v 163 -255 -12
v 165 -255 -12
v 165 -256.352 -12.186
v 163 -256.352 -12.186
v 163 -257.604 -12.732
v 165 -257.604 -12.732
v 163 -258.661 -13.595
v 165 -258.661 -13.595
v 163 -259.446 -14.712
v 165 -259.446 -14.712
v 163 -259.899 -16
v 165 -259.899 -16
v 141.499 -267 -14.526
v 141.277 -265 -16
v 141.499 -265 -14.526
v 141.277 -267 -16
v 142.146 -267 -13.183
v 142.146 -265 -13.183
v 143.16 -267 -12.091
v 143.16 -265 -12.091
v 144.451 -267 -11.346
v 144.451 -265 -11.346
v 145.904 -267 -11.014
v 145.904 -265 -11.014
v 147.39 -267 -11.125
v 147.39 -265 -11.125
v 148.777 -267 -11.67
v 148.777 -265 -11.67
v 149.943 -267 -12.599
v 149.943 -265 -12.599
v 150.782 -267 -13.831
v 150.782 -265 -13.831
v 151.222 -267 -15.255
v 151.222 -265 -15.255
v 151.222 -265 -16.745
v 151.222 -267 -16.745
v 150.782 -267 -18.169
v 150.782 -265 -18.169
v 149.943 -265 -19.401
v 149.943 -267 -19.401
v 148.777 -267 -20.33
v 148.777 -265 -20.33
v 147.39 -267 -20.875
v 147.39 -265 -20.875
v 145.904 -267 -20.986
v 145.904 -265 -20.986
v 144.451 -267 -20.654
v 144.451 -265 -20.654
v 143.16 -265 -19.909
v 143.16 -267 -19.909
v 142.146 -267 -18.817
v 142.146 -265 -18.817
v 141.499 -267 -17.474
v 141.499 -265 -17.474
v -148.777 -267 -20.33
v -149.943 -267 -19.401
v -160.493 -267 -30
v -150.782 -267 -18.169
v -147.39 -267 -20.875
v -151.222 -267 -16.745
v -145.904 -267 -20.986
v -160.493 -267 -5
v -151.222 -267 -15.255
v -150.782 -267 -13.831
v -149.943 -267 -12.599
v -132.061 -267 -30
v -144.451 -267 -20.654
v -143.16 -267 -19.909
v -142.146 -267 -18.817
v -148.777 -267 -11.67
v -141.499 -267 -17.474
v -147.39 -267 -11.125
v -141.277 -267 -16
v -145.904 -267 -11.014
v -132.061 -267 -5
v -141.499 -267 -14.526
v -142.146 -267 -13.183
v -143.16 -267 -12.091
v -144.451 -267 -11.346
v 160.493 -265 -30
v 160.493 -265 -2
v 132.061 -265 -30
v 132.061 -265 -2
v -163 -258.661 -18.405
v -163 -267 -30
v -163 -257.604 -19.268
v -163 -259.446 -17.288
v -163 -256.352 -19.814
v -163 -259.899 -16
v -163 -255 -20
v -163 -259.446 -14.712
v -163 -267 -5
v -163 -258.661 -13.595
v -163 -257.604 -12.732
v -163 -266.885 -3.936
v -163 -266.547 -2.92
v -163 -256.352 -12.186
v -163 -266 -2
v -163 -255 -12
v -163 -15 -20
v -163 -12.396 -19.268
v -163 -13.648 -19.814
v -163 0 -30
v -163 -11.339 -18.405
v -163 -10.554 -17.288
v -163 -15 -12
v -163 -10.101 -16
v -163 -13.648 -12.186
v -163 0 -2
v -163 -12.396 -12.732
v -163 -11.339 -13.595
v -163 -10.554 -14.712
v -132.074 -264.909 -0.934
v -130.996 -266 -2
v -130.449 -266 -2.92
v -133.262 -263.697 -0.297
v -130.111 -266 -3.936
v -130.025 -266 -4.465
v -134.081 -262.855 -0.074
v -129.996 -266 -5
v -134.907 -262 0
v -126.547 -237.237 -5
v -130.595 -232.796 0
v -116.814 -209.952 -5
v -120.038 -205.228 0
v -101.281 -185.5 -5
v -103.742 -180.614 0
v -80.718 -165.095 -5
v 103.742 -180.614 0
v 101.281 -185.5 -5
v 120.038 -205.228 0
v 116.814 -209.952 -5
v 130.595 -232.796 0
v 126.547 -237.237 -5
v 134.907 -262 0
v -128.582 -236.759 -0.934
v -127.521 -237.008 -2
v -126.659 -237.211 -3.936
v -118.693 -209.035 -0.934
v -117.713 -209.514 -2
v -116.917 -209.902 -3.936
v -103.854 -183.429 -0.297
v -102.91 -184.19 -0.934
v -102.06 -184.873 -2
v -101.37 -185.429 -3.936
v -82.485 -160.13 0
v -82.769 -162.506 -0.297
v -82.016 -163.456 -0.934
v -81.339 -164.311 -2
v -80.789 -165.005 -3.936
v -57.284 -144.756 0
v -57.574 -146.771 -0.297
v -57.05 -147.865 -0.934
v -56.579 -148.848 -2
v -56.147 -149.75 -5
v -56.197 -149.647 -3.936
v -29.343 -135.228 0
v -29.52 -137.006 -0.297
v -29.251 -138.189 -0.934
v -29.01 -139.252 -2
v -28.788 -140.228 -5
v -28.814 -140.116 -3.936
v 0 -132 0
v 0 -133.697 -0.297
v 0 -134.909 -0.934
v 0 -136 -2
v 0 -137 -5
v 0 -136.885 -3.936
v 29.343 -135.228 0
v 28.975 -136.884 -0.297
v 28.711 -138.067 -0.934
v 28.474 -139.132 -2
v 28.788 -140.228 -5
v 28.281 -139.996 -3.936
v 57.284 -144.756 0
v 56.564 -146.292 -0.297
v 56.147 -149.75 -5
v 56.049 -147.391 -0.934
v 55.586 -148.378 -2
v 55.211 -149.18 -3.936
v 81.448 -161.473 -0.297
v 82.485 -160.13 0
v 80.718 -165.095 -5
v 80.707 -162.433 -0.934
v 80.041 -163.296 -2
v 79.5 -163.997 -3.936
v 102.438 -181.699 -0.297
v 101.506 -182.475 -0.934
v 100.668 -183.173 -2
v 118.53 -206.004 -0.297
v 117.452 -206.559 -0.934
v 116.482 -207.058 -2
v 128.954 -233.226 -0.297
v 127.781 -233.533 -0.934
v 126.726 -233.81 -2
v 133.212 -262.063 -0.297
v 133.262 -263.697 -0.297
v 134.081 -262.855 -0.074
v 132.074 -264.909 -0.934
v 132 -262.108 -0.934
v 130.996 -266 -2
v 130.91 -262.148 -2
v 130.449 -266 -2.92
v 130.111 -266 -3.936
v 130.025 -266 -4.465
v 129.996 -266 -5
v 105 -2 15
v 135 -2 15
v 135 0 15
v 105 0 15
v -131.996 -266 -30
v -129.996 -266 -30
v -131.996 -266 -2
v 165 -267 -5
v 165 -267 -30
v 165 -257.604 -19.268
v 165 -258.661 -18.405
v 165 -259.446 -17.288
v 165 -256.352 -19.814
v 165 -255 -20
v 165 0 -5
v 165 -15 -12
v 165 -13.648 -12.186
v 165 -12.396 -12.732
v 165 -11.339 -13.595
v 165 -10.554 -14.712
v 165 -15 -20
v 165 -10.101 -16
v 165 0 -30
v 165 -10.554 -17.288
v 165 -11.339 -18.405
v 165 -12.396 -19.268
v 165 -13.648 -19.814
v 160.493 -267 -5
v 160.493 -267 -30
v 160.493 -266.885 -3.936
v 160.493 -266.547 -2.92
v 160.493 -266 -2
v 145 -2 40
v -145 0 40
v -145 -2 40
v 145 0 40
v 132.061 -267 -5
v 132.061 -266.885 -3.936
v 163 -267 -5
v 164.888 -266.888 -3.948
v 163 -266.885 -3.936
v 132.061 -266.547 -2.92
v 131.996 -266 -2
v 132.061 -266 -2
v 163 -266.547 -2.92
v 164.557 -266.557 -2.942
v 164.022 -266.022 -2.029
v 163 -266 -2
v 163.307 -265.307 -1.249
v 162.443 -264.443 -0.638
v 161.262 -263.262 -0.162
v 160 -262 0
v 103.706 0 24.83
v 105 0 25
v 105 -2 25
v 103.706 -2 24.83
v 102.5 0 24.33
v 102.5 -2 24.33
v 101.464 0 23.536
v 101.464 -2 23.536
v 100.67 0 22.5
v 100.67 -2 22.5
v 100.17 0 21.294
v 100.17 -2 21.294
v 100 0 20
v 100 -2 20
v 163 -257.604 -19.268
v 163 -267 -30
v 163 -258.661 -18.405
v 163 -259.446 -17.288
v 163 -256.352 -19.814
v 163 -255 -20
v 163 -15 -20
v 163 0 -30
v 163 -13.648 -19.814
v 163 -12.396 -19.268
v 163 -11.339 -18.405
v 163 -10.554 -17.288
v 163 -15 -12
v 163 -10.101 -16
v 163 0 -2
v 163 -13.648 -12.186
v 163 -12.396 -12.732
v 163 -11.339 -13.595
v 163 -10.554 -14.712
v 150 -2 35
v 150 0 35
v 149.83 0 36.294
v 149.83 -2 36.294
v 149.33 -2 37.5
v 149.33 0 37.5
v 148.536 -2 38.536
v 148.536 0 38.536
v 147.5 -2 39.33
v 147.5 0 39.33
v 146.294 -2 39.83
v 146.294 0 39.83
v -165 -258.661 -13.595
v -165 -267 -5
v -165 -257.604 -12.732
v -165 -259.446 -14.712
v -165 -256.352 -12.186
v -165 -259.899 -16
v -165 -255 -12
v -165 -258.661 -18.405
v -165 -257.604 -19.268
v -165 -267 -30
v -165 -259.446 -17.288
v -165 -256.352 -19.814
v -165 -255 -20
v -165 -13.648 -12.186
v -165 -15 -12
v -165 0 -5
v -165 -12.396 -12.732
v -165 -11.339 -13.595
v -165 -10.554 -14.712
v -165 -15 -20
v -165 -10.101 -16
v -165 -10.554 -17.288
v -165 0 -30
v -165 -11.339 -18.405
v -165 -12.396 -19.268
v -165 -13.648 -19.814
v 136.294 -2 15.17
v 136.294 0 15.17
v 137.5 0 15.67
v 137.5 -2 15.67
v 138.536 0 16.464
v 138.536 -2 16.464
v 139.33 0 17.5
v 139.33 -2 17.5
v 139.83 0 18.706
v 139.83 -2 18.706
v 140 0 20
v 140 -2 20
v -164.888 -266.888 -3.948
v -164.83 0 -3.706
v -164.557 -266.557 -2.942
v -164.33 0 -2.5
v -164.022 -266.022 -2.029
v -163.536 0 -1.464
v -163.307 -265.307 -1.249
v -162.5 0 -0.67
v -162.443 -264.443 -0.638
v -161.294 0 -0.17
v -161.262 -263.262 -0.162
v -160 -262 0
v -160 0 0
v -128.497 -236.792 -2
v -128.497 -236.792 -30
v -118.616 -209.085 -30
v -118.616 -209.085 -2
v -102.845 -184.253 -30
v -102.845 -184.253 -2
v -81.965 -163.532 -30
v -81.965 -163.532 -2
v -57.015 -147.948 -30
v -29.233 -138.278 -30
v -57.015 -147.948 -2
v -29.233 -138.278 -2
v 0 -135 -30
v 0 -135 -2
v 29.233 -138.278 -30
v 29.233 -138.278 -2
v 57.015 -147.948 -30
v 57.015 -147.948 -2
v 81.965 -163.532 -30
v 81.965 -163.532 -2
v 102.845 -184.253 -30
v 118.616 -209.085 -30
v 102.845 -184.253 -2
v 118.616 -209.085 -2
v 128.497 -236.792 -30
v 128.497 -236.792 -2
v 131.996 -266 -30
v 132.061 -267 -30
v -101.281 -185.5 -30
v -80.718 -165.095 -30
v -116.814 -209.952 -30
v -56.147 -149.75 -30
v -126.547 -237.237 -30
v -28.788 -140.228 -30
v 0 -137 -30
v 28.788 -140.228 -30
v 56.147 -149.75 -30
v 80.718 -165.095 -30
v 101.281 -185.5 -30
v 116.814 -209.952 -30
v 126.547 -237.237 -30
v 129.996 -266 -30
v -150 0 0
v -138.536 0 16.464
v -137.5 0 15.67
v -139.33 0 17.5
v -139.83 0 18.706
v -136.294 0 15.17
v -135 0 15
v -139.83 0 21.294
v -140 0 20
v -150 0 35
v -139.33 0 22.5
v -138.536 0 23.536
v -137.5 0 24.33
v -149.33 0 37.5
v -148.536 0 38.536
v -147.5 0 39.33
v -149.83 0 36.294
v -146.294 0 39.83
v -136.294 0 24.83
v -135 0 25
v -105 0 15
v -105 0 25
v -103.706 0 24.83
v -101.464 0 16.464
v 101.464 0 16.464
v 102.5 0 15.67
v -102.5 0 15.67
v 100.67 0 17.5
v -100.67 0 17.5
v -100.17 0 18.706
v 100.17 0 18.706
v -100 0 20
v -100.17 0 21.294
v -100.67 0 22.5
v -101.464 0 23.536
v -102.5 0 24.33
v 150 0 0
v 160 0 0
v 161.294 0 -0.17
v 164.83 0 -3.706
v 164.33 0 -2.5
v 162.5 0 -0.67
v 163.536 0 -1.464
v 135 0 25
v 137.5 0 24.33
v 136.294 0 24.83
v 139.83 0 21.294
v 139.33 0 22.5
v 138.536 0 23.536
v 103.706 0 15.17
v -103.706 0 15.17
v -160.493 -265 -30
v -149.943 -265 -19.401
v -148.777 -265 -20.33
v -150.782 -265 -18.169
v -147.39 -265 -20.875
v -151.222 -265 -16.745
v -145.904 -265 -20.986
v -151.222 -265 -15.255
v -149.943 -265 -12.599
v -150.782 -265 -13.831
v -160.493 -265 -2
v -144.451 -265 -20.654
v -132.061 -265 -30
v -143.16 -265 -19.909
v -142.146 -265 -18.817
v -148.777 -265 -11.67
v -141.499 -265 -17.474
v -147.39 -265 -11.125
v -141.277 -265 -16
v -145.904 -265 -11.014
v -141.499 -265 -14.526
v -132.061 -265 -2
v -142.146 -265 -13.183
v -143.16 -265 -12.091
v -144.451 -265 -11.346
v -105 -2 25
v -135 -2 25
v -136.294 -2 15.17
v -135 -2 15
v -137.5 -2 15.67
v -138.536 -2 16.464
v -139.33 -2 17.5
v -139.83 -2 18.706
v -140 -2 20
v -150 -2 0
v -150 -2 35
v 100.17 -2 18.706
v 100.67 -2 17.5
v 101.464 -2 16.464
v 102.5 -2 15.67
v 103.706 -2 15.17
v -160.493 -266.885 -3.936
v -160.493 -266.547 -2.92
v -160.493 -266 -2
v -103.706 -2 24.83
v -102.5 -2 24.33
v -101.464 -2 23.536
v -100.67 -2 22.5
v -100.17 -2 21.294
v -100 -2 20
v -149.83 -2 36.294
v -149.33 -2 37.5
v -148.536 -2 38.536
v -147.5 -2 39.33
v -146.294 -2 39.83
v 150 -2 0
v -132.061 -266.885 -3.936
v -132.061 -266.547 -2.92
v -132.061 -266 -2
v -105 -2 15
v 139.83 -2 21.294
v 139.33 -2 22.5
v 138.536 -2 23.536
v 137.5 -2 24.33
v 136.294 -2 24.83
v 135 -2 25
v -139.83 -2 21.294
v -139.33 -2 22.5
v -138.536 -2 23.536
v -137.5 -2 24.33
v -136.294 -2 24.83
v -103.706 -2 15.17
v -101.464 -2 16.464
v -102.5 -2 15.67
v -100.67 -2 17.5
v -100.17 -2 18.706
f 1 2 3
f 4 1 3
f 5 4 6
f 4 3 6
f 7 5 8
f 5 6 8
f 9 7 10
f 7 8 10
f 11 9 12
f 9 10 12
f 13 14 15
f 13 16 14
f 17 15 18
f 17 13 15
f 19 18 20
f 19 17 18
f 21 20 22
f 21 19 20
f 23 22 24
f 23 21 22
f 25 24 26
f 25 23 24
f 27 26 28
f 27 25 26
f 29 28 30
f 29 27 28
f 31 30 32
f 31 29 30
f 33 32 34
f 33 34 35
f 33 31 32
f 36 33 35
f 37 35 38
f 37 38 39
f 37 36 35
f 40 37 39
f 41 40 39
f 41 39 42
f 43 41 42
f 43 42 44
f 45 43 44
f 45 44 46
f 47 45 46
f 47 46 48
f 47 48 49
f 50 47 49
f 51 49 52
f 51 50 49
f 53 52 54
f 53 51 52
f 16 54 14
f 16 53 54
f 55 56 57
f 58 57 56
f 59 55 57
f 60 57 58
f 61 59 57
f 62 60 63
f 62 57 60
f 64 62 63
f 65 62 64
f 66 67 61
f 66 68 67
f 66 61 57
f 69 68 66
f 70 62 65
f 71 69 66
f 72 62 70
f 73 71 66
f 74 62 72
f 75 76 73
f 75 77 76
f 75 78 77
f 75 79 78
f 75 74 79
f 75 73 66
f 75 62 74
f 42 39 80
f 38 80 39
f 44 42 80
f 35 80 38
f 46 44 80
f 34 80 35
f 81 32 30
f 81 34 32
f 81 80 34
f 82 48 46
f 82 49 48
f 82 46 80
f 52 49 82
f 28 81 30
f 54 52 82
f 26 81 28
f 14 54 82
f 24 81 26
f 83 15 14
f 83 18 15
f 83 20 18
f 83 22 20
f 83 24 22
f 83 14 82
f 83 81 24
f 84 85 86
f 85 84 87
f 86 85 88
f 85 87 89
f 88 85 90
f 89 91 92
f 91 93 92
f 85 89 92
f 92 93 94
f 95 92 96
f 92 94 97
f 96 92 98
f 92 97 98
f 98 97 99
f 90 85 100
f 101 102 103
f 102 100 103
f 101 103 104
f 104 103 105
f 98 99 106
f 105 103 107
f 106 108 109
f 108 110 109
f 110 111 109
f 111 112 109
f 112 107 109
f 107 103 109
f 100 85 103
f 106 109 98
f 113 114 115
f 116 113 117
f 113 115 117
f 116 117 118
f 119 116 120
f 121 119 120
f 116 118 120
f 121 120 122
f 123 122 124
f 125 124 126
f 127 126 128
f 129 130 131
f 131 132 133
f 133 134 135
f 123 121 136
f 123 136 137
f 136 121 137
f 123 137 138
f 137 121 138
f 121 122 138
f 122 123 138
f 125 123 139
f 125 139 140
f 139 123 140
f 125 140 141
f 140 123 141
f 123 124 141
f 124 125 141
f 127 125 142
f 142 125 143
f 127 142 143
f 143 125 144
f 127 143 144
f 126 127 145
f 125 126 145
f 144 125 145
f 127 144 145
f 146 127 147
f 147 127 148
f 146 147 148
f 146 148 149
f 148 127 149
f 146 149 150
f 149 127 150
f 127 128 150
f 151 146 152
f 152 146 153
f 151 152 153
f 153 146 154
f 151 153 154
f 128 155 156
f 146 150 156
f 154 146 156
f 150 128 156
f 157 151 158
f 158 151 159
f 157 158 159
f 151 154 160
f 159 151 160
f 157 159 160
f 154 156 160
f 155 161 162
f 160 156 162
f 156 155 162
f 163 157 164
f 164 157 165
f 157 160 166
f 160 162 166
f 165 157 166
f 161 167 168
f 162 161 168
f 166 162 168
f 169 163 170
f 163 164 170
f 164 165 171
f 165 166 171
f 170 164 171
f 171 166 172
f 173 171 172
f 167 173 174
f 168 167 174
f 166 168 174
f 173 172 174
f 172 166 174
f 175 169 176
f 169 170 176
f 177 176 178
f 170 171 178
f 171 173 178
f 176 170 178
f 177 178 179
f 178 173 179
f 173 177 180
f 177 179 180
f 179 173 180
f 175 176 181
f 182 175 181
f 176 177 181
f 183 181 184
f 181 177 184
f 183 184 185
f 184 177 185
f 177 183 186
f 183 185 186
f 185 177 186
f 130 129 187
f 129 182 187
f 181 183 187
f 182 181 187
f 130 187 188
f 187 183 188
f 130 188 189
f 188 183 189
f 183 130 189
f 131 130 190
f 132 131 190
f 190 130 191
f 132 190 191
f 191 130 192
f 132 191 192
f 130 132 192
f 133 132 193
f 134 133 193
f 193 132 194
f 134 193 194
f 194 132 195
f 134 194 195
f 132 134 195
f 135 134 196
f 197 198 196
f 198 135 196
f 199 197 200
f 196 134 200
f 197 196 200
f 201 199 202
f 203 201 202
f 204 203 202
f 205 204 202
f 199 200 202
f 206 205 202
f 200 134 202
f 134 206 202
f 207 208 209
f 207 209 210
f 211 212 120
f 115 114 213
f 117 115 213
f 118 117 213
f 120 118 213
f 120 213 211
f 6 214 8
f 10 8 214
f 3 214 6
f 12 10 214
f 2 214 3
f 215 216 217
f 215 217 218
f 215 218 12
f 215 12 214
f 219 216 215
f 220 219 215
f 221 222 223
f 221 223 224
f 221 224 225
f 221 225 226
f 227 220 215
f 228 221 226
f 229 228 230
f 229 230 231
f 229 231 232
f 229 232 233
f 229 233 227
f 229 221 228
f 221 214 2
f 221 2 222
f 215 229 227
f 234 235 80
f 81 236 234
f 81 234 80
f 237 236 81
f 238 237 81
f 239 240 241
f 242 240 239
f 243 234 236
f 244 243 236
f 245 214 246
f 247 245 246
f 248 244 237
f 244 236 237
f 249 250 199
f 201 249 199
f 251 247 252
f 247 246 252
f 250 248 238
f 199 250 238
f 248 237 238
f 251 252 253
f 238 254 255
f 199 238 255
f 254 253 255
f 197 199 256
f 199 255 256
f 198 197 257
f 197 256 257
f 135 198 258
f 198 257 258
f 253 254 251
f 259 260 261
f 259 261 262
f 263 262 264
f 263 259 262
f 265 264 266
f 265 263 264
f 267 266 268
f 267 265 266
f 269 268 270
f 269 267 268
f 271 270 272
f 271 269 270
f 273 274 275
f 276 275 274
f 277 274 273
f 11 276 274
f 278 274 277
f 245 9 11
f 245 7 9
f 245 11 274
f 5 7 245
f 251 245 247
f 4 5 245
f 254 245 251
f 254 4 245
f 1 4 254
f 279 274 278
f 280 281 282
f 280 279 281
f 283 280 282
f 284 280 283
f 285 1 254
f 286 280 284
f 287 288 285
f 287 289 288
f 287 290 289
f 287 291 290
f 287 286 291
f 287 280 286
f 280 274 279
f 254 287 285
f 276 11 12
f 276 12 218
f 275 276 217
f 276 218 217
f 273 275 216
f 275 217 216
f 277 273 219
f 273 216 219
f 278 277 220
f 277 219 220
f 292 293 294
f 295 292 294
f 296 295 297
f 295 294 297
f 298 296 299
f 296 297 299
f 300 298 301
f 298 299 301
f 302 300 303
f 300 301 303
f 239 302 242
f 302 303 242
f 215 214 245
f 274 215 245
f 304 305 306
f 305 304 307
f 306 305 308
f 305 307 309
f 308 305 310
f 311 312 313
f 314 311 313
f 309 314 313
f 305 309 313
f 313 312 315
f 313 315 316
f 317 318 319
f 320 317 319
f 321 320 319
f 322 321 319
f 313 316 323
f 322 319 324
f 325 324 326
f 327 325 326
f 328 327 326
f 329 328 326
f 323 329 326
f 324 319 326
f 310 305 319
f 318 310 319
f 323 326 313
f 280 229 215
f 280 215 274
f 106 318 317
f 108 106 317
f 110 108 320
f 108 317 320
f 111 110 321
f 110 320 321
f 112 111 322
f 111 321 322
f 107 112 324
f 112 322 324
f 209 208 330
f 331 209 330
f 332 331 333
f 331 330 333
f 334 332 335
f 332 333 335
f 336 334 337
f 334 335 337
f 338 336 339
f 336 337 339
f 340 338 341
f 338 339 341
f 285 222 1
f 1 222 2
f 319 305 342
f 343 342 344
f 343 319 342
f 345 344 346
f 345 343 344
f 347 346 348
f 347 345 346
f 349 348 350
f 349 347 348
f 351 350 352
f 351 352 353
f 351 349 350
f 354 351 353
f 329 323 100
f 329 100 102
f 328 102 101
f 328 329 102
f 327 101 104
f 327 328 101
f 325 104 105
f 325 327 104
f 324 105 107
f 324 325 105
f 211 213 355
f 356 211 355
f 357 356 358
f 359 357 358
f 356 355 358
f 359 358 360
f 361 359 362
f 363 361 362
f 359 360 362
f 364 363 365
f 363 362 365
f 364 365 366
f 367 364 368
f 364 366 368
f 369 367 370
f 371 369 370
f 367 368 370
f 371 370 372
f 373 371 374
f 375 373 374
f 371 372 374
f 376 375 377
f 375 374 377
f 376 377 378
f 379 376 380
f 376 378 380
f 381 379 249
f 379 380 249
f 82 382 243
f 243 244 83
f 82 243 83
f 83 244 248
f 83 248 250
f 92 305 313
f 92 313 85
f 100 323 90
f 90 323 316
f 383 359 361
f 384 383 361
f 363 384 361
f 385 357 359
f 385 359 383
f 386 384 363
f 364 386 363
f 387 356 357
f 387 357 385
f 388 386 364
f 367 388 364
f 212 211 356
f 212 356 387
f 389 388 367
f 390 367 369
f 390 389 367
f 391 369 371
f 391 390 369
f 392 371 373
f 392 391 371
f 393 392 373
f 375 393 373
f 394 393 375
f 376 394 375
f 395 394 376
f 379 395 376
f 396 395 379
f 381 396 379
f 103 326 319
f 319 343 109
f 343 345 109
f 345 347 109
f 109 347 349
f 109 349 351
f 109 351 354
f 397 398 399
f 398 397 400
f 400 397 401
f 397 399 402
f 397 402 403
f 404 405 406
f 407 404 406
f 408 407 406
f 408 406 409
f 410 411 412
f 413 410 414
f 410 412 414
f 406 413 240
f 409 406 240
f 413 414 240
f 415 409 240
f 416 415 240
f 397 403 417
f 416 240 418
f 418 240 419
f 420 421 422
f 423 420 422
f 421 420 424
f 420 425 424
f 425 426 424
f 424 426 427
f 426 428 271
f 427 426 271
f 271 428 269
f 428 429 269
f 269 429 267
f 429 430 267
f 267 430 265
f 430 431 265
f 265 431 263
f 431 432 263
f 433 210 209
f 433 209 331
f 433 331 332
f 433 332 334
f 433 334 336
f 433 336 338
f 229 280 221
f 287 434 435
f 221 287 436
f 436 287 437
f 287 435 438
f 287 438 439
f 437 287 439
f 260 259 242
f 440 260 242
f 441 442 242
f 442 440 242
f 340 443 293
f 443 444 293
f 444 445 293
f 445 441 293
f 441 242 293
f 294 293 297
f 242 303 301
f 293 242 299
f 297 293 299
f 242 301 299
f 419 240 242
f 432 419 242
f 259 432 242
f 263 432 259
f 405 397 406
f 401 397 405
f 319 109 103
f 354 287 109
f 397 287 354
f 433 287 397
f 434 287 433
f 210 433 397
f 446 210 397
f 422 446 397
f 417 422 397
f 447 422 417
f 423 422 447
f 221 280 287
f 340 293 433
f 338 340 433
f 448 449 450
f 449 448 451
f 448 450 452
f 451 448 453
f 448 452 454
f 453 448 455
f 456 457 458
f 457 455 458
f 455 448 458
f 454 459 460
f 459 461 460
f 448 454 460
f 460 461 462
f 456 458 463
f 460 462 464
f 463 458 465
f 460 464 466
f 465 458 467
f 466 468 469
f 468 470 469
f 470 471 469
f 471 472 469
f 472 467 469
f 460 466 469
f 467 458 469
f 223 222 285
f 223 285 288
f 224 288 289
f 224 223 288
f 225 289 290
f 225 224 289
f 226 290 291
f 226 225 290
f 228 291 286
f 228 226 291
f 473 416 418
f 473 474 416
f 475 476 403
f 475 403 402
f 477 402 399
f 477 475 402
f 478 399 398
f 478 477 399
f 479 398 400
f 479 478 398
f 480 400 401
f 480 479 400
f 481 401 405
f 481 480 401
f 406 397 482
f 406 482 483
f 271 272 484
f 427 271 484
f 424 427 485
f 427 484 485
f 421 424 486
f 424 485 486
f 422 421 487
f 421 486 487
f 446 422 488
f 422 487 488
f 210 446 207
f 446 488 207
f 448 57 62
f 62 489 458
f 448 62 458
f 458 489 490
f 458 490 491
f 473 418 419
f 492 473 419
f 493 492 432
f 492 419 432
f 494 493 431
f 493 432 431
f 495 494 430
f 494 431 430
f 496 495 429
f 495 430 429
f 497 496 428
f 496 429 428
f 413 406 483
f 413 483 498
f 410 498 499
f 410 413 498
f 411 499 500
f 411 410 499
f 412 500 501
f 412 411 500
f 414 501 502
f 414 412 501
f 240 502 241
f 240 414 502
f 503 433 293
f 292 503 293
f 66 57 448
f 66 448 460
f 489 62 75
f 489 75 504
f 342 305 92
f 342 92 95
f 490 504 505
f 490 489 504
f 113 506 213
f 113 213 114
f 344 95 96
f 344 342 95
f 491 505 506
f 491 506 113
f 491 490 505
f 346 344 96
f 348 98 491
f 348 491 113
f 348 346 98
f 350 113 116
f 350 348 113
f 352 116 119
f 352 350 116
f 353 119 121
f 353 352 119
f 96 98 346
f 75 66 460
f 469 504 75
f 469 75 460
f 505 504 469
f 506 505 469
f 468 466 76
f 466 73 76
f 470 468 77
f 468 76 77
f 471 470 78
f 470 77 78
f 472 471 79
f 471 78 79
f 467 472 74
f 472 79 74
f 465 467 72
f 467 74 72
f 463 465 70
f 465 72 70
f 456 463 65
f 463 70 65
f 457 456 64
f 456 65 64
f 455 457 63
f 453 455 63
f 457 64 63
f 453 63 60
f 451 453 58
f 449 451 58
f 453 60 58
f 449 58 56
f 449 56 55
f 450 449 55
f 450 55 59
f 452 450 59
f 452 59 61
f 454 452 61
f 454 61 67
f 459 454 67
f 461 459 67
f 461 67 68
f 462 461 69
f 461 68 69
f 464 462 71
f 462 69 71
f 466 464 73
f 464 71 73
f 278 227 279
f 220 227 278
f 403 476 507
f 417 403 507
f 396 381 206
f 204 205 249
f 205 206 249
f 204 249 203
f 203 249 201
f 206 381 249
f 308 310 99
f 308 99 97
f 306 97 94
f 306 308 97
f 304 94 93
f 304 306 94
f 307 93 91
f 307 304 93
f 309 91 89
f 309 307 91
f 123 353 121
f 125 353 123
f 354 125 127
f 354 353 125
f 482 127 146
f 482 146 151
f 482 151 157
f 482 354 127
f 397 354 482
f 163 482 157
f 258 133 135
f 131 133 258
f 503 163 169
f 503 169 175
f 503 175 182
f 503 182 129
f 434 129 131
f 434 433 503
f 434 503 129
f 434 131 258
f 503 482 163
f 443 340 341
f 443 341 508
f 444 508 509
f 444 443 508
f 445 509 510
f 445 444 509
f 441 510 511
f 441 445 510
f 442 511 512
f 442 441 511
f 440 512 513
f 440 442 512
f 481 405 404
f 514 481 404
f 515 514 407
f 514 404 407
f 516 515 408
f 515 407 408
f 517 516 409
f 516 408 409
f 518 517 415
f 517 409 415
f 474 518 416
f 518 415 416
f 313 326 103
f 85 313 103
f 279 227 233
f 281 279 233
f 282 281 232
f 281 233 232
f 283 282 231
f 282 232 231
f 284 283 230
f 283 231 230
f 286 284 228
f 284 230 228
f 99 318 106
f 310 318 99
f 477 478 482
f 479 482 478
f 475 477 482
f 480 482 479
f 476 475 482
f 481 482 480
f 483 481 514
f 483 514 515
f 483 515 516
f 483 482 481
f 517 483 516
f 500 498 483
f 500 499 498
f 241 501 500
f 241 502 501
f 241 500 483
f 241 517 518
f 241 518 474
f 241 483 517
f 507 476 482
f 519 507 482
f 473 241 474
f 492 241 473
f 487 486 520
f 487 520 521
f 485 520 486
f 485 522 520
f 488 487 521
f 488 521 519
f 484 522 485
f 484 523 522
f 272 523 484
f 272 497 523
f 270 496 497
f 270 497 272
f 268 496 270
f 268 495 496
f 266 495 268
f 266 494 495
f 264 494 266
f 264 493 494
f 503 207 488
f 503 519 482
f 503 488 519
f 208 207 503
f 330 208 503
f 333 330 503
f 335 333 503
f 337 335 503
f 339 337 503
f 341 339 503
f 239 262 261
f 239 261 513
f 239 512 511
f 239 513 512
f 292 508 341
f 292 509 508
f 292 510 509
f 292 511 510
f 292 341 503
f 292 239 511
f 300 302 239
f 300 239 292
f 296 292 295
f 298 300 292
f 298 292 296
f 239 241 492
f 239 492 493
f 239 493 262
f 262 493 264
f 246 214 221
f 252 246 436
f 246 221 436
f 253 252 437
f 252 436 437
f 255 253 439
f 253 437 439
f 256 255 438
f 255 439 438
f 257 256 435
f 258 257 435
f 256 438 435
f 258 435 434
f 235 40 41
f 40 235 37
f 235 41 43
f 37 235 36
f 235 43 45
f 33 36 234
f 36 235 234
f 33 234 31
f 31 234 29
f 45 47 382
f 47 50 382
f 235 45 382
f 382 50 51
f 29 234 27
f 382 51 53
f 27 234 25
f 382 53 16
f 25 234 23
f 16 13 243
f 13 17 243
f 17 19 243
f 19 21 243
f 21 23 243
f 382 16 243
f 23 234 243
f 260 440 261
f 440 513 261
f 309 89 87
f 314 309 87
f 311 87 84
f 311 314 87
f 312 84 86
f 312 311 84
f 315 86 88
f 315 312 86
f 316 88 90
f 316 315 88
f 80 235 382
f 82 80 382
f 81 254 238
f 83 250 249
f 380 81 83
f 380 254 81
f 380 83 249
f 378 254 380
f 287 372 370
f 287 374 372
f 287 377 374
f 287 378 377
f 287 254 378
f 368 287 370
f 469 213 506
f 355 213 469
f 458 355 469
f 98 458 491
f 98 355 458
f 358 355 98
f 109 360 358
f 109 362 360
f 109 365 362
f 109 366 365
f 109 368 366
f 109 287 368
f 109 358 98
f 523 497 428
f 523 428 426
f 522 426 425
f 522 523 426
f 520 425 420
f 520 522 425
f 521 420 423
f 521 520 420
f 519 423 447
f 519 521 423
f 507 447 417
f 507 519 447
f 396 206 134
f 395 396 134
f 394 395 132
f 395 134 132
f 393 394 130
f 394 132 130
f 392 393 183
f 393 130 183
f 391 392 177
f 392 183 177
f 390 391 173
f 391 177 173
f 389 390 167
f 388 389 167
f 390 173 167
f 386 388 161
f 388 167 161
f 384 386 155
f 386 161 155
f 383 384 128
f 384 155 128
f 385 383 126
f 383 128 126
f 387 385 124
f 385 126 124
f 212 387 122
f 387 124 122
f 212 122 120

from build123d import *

# Parameters (mm, degrees)
F1_DEPTH       = 267
F2_W           = 250
F2_H           = 8
F3_DEPTH       = 5
F4_R           = 130
F5_DEPTH       = 12.5
F6_W           = 150
F6_H           = 40
F7_DEPTH       = 2
F8_W           = 40
F8_H           = 10
F9_DEPTH       = 12.5
F10_F1_R       = 5
F10_F2_R       = 5
F10_F3_R       = 4.9999
F10_F4_R       = 4.9999
F10_2_T1_DEPTH = 35
F11_W          = 28.4319519997
F11_H          = 28
F12_DEPTH      = 2
F13_R          = 5
F14_DEPTH      = 5
F17_T1_DEPTH   = 27
F17_T3_DEPTH   = 292
F17_T5_DEPTH   = 60
F20_DEPTH      = 28
F21_T2_ANGLE   = 186.62682558


# Not quite as in the source:
# - a fillet or chamfer that OpenCascade refuses, or shapes differently, is made with other operations: its cross-section is extruded or revolved along the edge and cut away or added
# - a fillet or chamfer is up to 0.001 mm smaller than in the source, because OpenCascade refuses the exact size


with BuildPart() as f1:
    # F0 (on Front) → F1 (new body)
    with BuildSketch(Plane.XZ):
        Polygon((-165, -30), (-163, -30), (-163, -2), (0, -2), (0, 0), (-165, 0), align=None)
    extrude(amount=F1_DEPTH)


with BuildPart() as f3:
    # F2 (on face) → F3 (new body, symmetric)
    with BuildSketch(Plane(origin=(-165, 0, 0), x_dir=(0, -1, 0), z_dir=(-1, 0, 0))):
        with Locations((135, -16)):
            Rectangle(F2_W, F2_H)
    extrude(amount=F3_DEPTH, both=True)

    # F10#2: fillet of radius 5 on 4 edges, made by hand

    # F10_2_s2 → F10_2_t1 (cut)
    with BuildSketch(Plane.YZ.offset(-182.5)):
        with BuildLine():
            ThreePointArc((-15, -12), (-11.4644660941, -13.4644660941), (-10, -17))
            Line((-10, -17), (-10, -12))
            Line((-10, -12), (-15, -12))
        make_face()
        with BuildLine():
            ThreePointArc((-15, -20), (-11.4644660941, -18.5355339059), (-10, -15))
            Line((-10, -15), (-10, -20))
            Line((-10, -20), (-15, -20))
        make_face()
        with BuildLine():
            ThreePointArc((-260, -15), (-258.5355339059, -18.5355339059), (-255, -20))
            Line((-255, -20), (-260, -20))
            Line((-260, -20), (-260, -15))
        make_face()
        with BuildLine():
            ThreePointArc((-255, -12), (-258.5355339059, -13.4644660941), (-260, -17))
            Line((-260, -17), (-260, -12))
            Line((-260, -12), (-255, -12))
        make_face()
    extrude(amount=F10_2_T1_DEPTH, mode=Mode.SUBTRACT)


with BuildPart() as f5:
    # F4 (on face) → F5 (new body, symmetric)
    with BuildSketch(Plane.XY):
        with Locations((0, -267)):
            Circle(F4_R)
    extrude(amount=F5_DEPTH, both=True)


with BuildPart() as f7:
    # F6 (on face) → F7 (new body)
    with BuildSketch(Plane(origin=(0, 0, 0), x_dir=(-1, 0, 0), z_dir=(0, 1, 0))):
        with Locations((75, 20)):
            Rectangle(F6_W, F6_H)
    extrude(amount=-F7_DEPTH)


with BuildPart() as f9:
    # F8 (on face) → F9 (new body, symmetric)
    with BuildSketch(Plane.XZ.offset(2)):
        with Locations((-120, 20)):
            Rectangle(F8_W, F8_H)
    extrude(amount=F9_DEPTH, both=True)

    # F10: fillet of radius 5 on 4 edges, made by hand

    # F10_f1
    f10_f1_edges = [f9.edges().sort_by_distance(p)[0] for p in [
        (-140, -2, 25),
    ]]
    fillet(f10_f1_edges, radius=F10_F1_R)

    # F10_f2
    f10_f2_edges = [f9.edges().sort_by_distance(p)[0] for p in [
        (-100, -2, 25),
    ]]
    fillet(f10_f2_edges, radius=F10_F2_R)

    # F10_f3 (radius 5 in the source; OpenCascade refuses exactly that, so slightly less here)
    f10_f3_edges = [f9.edges().sort_by_distance(p)[0] for p in [
        (-100, -2, 15),
    ]]
    fillet(f10_f3_edges, radius=F10_F3_R)

    # F10_f4 (radius 5 in the source; OpenCascade refuses exactly that, so slightly less here)
    f10_f4_edges = [f9.edges().sort_by_distance(p)[0] for p in [
        (-140, -2, 15),
    ]]
    fillet(f10_f4_edges, radius=F10_F4_R)


with BuildPart() as f12:
    # F11 (on face) → F12 (new body)
    with BuildSketch(Plane.XZ.offset(267)):
        with Locations((-146.2773531675, -16)):
            Rectangle(F11_W, F11_H)
    extrude(amount=-F12_DEPTH)


with BuildPart() as f14:
    # F13 (on face) → F14 (new body, symmetric)
    with BuildSketch(Plane.XZ.offset(267)):
        with Locations((-146.2773531675, -16)):
            Circle(F13_R)
    extrude(amount=F14_DEPTH, both=True)


with BuildPart() as f1_1:
    add(f1.part)

    # F15: union F7, F12
    add(f7.part)
    add(f12.part)

    # F16: cut F9, F3, F5, F14
    add(f9.part, mode=Mode.SUBTRACT)
    add(f3.part, mode=Mode.SUBTRACT)
    add(f5.part, mode=Mode.SUBTRACT)
    add(f14.part, mode=Mode.SUBTRACT)

    # F17: fillet of radius 5 on 3 edges, made by hand

    # F17_s2 → F17_t1 (cut)
    with BuildSketch(Plane.XZ.offset(-12.5)):
        with BuildLine():
            ThreePointArc((-150, 35), (-148.5355339059, 38.5355339059), (-145, 40))
            Line((-145, 40), (-150, 40))
            Line((-150, 40), (-150, 35))
        make_face()
    extrude(amount=F17_T1_DEPTH, mode=Mode.SUBTRACT)

    # F17_s4 → F17_t3 (cut)
    with BuildSketch(Plane.XZ.offset(-12.5)):
        with BuildLine():
            ThreePointArc((-165, -5), (-163.5355339059, -1.4644660941), (-160, 0))
            Line((-160, 0), (-165, 0))
            Line((-165, 0), (-165, -5))
        make_face()
    extrude(amount=F17_T3_DEPTH, mode=Mode.SUBTRACT)

    # F17_s6 → F17_t5 (cut)
    with BuildSketch(Plane.YZ.offset(-177.5)):
        with BuildLine():
            ThreePointArc((-267, -5), (-265.5355339059, -1.4644660941), (-262, 0))
            Line((-262, 0), (-267, 0))
            Line((-267, 0), (-267, -5))
        make_face()
    extrude(amount=F17_T5_DEPTH, mode=Mode.SUBTRACT)

    # F18: F1 across plane


with BuildPart() as f1_2:
    add(f1_1.part)
    add(f1_1.part.mirror(Plane.YZ))

    # F19 (on face) → F20 (join)
    with BuildSketch(Plane(origin=(0, 0, -2), x_dir=(1, 0, 0), z_dir=(0, 0, -1))):
        with BuildLine():
            ThreePointArc((129.9961537893, 266), (0, 137), (-129.9961537893, 266))
            Line((-129.9961537893, 266), (-131.9962120669, 266))
            ThreePointArc((-131.9962120669, 266), (0, 135), (131.9962120669, 266))
            Line((131.9962120669, 266), (129.9961537893, 266))
        make_face()
    extrude(amount=F20_DEPTH)

    # F21: fillet of radius 5 on 1 edges, made by hand

    # F21_s1 → F21_t2 (revolve, cut)
    with BuildSketch(Plane(origin=(15.4061976699, -266.1080656422, 0), x_dir=(0, 0, 1), z_dir=(0.0577977346, -0.9983283137, 0))):
        with BuildLine():
            ThreePointArc((0, 150.4319951252), (-1.4644660941, 146.8964612192), (-5, 145.4319951252))
            Line((-5, 145.4319951252), (0, 145.4319951252))
            Line((0, 145.4319951252), (0, 150.4319951252))
        make_face()
    revolve(axis=Axis((0, -267, 0), (0, 0, -1)), revolution_arc=F21_T2_ANGLE, mode=Mode.SUBTRACT)


solid = f1_2.part
